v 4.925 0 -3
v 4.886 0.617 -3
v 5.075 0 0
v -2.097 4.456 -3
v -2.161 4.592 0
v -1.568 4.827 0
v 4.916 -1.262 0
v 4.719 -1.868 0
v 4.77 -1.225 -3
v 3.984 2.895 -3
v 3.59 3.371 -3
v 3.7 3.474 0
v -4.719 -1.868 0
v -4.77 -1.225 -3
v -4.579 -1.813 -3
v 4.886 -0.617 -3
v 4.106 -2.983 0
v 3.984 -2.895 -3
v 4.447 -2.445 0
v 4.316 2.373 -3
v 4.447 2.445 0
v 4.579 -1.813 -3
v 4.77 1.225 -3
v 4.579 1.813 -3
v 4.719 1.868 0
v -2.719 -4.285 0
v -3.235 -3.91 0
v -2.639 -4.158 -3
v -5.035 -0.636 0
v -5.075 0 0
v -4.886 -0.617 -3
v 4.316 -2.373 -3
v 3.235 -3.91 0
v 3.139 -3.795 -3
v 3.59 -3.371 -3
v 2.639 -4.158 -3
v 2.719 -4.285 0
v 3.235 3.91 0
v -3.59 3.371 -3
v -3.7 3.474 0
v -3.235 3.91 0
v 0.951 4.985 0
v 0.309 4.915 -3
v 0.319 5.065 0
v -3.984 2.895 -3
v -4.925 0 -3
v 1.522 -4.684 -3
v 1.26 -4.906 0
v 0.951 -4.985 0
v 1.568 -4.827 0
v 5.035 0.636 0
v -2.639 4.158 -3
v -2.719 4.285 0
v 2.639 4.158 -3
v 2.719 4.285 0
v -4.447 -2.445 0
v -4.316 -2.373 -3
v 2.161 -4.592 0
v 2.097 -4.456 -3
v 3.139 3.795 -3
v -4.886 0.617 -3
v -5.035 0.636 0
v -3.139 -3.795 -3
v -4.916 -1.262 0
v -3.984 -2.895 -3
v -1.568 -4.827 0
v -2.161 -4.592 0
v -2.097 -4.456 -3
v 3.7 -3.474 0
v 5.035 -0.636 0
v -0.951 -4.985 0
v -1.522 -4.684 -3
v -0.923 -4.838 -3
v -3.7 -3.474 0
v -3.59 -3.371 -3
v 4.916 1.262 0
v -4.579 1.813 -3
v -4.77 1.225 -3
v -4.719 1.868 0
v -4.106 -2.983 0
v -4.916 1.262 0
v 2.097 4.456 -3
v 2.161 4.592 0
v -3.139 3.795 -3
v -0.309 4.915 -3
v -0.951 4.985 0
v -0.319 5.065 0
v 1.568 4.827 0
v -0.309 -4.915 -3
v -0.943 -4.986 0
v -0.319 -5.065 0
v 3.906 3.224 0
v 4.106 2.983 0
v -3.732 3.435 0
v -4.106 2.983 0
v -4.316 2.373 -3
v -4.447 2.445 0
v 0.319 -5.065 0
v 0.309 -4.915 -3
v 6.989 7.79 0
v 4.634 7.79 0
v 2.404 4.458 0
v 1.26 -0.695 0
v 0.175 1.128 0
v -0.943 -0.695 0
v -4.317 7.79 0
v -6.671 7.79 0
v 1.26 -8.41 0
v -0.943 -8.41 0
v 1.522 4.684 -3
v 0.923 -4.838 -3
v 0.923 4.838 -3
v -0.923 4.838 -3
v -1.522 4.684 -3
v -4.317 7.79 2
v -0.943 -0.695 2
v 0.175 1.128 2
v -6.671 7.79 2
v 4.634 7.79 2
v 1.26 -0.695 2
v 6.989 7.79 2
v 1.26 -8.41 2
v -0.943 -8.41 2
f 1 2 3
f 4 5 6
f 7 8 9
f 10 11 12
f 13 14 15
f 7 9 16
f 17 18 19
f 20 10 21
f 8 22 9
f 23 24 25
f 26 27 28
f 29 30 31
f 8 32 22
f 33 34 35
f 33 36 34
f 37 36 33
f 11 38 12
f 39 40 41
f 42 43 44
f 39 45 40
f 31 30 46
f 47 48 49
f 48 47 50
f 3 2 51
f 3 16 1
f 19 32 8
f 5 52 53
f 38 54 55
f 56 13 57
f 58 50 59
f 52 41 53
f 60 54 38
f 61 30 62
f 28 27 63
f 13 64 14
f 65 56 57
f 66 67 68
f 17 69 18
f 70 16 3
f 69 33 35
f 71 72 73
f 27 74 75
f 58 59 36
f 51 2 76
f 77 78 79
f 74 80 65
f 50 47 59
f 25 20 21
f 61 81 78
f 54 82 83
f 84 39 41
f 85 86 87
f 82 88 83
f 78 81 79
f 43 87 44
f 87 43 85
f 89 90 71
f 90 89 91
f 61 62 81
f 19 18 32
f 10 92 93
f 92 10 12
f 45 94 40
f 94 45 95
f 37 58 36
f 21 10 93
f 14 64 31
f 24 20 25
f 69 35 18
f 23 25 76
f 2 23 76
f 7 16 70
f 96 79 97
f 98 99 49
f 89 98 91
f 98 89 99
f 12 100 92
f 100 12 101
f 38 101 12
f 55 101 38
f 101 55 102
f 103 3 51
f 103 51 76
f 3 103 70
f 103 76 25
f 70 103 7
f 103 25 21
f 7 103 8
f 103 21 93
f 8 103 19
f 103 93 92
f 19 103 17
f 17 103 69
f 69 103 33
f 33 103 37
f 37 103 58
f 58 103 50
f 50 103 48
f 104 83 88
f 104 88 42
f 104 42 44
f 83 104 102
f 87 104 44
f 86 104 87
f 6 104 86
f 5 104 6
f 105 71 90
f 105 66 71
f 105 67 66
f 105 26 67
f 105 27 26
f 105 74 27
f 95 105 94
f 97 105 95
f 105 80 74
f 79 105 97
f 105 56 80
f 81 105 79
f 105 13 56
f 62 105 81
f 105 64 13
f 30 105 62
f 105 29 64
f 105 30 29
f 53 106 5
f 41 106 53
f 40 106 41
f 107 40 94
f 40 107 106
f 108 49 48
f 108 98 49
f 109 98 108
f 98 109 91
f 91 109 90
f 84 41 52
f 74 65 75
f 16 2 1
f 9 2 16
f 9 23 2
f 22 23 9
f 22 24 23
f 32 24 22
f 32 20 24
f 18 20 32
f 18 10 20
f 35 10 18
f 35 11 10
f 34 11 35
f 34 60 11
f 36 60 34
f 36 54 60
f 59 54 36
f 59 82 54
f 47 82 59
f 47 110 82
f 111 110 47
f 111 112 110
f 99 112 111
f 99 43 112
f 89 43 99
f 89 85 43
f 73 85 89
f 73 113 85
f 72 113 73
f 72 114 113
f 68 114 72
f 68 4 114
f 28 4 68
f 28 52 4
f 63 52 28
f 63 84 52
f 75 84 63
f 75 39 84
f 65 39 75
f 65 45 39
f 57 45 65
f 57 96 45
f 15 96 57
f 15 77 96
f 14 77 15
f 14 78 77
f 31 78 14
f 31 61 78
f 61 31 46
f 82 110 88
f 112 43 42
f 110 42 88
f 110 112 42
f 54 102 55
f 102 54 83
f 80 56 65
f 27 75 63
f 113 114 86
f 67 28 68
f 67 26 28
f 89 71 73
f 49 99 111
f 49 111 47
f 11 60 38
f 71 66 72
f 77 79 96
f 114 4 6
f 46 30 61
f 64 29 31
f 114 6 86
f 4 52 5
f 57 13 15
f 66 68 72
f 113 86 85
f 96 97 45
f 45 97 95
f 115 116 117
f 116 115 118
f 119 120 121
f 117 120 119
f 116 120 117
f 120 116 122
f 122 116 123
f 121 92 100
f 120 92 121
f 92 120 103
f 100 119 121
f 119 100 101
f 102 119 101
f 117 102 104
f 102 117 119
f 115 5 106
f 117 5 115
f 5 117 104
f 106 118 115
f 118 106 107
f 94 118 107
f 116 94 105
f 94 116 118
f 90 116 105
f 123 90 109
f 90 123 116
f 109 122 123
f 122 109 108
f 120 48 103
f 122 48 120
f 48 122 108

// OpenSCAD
$fn = 50;


difference() {
	union() {
		translate(v = [0, 0, -3.0000000000]) {
			cylinder(h = 3, r1 = 4.9250000000, r2 = 5.0750000000);
		}
		translate(v = [0, -0.5000000000, 0]) {
			linear_extrude(height = 2) {
				text(font = "Webdings", halign = "center", size = 16, text = "Y", valign = "center");
			}
		}
	}
	union();
}
